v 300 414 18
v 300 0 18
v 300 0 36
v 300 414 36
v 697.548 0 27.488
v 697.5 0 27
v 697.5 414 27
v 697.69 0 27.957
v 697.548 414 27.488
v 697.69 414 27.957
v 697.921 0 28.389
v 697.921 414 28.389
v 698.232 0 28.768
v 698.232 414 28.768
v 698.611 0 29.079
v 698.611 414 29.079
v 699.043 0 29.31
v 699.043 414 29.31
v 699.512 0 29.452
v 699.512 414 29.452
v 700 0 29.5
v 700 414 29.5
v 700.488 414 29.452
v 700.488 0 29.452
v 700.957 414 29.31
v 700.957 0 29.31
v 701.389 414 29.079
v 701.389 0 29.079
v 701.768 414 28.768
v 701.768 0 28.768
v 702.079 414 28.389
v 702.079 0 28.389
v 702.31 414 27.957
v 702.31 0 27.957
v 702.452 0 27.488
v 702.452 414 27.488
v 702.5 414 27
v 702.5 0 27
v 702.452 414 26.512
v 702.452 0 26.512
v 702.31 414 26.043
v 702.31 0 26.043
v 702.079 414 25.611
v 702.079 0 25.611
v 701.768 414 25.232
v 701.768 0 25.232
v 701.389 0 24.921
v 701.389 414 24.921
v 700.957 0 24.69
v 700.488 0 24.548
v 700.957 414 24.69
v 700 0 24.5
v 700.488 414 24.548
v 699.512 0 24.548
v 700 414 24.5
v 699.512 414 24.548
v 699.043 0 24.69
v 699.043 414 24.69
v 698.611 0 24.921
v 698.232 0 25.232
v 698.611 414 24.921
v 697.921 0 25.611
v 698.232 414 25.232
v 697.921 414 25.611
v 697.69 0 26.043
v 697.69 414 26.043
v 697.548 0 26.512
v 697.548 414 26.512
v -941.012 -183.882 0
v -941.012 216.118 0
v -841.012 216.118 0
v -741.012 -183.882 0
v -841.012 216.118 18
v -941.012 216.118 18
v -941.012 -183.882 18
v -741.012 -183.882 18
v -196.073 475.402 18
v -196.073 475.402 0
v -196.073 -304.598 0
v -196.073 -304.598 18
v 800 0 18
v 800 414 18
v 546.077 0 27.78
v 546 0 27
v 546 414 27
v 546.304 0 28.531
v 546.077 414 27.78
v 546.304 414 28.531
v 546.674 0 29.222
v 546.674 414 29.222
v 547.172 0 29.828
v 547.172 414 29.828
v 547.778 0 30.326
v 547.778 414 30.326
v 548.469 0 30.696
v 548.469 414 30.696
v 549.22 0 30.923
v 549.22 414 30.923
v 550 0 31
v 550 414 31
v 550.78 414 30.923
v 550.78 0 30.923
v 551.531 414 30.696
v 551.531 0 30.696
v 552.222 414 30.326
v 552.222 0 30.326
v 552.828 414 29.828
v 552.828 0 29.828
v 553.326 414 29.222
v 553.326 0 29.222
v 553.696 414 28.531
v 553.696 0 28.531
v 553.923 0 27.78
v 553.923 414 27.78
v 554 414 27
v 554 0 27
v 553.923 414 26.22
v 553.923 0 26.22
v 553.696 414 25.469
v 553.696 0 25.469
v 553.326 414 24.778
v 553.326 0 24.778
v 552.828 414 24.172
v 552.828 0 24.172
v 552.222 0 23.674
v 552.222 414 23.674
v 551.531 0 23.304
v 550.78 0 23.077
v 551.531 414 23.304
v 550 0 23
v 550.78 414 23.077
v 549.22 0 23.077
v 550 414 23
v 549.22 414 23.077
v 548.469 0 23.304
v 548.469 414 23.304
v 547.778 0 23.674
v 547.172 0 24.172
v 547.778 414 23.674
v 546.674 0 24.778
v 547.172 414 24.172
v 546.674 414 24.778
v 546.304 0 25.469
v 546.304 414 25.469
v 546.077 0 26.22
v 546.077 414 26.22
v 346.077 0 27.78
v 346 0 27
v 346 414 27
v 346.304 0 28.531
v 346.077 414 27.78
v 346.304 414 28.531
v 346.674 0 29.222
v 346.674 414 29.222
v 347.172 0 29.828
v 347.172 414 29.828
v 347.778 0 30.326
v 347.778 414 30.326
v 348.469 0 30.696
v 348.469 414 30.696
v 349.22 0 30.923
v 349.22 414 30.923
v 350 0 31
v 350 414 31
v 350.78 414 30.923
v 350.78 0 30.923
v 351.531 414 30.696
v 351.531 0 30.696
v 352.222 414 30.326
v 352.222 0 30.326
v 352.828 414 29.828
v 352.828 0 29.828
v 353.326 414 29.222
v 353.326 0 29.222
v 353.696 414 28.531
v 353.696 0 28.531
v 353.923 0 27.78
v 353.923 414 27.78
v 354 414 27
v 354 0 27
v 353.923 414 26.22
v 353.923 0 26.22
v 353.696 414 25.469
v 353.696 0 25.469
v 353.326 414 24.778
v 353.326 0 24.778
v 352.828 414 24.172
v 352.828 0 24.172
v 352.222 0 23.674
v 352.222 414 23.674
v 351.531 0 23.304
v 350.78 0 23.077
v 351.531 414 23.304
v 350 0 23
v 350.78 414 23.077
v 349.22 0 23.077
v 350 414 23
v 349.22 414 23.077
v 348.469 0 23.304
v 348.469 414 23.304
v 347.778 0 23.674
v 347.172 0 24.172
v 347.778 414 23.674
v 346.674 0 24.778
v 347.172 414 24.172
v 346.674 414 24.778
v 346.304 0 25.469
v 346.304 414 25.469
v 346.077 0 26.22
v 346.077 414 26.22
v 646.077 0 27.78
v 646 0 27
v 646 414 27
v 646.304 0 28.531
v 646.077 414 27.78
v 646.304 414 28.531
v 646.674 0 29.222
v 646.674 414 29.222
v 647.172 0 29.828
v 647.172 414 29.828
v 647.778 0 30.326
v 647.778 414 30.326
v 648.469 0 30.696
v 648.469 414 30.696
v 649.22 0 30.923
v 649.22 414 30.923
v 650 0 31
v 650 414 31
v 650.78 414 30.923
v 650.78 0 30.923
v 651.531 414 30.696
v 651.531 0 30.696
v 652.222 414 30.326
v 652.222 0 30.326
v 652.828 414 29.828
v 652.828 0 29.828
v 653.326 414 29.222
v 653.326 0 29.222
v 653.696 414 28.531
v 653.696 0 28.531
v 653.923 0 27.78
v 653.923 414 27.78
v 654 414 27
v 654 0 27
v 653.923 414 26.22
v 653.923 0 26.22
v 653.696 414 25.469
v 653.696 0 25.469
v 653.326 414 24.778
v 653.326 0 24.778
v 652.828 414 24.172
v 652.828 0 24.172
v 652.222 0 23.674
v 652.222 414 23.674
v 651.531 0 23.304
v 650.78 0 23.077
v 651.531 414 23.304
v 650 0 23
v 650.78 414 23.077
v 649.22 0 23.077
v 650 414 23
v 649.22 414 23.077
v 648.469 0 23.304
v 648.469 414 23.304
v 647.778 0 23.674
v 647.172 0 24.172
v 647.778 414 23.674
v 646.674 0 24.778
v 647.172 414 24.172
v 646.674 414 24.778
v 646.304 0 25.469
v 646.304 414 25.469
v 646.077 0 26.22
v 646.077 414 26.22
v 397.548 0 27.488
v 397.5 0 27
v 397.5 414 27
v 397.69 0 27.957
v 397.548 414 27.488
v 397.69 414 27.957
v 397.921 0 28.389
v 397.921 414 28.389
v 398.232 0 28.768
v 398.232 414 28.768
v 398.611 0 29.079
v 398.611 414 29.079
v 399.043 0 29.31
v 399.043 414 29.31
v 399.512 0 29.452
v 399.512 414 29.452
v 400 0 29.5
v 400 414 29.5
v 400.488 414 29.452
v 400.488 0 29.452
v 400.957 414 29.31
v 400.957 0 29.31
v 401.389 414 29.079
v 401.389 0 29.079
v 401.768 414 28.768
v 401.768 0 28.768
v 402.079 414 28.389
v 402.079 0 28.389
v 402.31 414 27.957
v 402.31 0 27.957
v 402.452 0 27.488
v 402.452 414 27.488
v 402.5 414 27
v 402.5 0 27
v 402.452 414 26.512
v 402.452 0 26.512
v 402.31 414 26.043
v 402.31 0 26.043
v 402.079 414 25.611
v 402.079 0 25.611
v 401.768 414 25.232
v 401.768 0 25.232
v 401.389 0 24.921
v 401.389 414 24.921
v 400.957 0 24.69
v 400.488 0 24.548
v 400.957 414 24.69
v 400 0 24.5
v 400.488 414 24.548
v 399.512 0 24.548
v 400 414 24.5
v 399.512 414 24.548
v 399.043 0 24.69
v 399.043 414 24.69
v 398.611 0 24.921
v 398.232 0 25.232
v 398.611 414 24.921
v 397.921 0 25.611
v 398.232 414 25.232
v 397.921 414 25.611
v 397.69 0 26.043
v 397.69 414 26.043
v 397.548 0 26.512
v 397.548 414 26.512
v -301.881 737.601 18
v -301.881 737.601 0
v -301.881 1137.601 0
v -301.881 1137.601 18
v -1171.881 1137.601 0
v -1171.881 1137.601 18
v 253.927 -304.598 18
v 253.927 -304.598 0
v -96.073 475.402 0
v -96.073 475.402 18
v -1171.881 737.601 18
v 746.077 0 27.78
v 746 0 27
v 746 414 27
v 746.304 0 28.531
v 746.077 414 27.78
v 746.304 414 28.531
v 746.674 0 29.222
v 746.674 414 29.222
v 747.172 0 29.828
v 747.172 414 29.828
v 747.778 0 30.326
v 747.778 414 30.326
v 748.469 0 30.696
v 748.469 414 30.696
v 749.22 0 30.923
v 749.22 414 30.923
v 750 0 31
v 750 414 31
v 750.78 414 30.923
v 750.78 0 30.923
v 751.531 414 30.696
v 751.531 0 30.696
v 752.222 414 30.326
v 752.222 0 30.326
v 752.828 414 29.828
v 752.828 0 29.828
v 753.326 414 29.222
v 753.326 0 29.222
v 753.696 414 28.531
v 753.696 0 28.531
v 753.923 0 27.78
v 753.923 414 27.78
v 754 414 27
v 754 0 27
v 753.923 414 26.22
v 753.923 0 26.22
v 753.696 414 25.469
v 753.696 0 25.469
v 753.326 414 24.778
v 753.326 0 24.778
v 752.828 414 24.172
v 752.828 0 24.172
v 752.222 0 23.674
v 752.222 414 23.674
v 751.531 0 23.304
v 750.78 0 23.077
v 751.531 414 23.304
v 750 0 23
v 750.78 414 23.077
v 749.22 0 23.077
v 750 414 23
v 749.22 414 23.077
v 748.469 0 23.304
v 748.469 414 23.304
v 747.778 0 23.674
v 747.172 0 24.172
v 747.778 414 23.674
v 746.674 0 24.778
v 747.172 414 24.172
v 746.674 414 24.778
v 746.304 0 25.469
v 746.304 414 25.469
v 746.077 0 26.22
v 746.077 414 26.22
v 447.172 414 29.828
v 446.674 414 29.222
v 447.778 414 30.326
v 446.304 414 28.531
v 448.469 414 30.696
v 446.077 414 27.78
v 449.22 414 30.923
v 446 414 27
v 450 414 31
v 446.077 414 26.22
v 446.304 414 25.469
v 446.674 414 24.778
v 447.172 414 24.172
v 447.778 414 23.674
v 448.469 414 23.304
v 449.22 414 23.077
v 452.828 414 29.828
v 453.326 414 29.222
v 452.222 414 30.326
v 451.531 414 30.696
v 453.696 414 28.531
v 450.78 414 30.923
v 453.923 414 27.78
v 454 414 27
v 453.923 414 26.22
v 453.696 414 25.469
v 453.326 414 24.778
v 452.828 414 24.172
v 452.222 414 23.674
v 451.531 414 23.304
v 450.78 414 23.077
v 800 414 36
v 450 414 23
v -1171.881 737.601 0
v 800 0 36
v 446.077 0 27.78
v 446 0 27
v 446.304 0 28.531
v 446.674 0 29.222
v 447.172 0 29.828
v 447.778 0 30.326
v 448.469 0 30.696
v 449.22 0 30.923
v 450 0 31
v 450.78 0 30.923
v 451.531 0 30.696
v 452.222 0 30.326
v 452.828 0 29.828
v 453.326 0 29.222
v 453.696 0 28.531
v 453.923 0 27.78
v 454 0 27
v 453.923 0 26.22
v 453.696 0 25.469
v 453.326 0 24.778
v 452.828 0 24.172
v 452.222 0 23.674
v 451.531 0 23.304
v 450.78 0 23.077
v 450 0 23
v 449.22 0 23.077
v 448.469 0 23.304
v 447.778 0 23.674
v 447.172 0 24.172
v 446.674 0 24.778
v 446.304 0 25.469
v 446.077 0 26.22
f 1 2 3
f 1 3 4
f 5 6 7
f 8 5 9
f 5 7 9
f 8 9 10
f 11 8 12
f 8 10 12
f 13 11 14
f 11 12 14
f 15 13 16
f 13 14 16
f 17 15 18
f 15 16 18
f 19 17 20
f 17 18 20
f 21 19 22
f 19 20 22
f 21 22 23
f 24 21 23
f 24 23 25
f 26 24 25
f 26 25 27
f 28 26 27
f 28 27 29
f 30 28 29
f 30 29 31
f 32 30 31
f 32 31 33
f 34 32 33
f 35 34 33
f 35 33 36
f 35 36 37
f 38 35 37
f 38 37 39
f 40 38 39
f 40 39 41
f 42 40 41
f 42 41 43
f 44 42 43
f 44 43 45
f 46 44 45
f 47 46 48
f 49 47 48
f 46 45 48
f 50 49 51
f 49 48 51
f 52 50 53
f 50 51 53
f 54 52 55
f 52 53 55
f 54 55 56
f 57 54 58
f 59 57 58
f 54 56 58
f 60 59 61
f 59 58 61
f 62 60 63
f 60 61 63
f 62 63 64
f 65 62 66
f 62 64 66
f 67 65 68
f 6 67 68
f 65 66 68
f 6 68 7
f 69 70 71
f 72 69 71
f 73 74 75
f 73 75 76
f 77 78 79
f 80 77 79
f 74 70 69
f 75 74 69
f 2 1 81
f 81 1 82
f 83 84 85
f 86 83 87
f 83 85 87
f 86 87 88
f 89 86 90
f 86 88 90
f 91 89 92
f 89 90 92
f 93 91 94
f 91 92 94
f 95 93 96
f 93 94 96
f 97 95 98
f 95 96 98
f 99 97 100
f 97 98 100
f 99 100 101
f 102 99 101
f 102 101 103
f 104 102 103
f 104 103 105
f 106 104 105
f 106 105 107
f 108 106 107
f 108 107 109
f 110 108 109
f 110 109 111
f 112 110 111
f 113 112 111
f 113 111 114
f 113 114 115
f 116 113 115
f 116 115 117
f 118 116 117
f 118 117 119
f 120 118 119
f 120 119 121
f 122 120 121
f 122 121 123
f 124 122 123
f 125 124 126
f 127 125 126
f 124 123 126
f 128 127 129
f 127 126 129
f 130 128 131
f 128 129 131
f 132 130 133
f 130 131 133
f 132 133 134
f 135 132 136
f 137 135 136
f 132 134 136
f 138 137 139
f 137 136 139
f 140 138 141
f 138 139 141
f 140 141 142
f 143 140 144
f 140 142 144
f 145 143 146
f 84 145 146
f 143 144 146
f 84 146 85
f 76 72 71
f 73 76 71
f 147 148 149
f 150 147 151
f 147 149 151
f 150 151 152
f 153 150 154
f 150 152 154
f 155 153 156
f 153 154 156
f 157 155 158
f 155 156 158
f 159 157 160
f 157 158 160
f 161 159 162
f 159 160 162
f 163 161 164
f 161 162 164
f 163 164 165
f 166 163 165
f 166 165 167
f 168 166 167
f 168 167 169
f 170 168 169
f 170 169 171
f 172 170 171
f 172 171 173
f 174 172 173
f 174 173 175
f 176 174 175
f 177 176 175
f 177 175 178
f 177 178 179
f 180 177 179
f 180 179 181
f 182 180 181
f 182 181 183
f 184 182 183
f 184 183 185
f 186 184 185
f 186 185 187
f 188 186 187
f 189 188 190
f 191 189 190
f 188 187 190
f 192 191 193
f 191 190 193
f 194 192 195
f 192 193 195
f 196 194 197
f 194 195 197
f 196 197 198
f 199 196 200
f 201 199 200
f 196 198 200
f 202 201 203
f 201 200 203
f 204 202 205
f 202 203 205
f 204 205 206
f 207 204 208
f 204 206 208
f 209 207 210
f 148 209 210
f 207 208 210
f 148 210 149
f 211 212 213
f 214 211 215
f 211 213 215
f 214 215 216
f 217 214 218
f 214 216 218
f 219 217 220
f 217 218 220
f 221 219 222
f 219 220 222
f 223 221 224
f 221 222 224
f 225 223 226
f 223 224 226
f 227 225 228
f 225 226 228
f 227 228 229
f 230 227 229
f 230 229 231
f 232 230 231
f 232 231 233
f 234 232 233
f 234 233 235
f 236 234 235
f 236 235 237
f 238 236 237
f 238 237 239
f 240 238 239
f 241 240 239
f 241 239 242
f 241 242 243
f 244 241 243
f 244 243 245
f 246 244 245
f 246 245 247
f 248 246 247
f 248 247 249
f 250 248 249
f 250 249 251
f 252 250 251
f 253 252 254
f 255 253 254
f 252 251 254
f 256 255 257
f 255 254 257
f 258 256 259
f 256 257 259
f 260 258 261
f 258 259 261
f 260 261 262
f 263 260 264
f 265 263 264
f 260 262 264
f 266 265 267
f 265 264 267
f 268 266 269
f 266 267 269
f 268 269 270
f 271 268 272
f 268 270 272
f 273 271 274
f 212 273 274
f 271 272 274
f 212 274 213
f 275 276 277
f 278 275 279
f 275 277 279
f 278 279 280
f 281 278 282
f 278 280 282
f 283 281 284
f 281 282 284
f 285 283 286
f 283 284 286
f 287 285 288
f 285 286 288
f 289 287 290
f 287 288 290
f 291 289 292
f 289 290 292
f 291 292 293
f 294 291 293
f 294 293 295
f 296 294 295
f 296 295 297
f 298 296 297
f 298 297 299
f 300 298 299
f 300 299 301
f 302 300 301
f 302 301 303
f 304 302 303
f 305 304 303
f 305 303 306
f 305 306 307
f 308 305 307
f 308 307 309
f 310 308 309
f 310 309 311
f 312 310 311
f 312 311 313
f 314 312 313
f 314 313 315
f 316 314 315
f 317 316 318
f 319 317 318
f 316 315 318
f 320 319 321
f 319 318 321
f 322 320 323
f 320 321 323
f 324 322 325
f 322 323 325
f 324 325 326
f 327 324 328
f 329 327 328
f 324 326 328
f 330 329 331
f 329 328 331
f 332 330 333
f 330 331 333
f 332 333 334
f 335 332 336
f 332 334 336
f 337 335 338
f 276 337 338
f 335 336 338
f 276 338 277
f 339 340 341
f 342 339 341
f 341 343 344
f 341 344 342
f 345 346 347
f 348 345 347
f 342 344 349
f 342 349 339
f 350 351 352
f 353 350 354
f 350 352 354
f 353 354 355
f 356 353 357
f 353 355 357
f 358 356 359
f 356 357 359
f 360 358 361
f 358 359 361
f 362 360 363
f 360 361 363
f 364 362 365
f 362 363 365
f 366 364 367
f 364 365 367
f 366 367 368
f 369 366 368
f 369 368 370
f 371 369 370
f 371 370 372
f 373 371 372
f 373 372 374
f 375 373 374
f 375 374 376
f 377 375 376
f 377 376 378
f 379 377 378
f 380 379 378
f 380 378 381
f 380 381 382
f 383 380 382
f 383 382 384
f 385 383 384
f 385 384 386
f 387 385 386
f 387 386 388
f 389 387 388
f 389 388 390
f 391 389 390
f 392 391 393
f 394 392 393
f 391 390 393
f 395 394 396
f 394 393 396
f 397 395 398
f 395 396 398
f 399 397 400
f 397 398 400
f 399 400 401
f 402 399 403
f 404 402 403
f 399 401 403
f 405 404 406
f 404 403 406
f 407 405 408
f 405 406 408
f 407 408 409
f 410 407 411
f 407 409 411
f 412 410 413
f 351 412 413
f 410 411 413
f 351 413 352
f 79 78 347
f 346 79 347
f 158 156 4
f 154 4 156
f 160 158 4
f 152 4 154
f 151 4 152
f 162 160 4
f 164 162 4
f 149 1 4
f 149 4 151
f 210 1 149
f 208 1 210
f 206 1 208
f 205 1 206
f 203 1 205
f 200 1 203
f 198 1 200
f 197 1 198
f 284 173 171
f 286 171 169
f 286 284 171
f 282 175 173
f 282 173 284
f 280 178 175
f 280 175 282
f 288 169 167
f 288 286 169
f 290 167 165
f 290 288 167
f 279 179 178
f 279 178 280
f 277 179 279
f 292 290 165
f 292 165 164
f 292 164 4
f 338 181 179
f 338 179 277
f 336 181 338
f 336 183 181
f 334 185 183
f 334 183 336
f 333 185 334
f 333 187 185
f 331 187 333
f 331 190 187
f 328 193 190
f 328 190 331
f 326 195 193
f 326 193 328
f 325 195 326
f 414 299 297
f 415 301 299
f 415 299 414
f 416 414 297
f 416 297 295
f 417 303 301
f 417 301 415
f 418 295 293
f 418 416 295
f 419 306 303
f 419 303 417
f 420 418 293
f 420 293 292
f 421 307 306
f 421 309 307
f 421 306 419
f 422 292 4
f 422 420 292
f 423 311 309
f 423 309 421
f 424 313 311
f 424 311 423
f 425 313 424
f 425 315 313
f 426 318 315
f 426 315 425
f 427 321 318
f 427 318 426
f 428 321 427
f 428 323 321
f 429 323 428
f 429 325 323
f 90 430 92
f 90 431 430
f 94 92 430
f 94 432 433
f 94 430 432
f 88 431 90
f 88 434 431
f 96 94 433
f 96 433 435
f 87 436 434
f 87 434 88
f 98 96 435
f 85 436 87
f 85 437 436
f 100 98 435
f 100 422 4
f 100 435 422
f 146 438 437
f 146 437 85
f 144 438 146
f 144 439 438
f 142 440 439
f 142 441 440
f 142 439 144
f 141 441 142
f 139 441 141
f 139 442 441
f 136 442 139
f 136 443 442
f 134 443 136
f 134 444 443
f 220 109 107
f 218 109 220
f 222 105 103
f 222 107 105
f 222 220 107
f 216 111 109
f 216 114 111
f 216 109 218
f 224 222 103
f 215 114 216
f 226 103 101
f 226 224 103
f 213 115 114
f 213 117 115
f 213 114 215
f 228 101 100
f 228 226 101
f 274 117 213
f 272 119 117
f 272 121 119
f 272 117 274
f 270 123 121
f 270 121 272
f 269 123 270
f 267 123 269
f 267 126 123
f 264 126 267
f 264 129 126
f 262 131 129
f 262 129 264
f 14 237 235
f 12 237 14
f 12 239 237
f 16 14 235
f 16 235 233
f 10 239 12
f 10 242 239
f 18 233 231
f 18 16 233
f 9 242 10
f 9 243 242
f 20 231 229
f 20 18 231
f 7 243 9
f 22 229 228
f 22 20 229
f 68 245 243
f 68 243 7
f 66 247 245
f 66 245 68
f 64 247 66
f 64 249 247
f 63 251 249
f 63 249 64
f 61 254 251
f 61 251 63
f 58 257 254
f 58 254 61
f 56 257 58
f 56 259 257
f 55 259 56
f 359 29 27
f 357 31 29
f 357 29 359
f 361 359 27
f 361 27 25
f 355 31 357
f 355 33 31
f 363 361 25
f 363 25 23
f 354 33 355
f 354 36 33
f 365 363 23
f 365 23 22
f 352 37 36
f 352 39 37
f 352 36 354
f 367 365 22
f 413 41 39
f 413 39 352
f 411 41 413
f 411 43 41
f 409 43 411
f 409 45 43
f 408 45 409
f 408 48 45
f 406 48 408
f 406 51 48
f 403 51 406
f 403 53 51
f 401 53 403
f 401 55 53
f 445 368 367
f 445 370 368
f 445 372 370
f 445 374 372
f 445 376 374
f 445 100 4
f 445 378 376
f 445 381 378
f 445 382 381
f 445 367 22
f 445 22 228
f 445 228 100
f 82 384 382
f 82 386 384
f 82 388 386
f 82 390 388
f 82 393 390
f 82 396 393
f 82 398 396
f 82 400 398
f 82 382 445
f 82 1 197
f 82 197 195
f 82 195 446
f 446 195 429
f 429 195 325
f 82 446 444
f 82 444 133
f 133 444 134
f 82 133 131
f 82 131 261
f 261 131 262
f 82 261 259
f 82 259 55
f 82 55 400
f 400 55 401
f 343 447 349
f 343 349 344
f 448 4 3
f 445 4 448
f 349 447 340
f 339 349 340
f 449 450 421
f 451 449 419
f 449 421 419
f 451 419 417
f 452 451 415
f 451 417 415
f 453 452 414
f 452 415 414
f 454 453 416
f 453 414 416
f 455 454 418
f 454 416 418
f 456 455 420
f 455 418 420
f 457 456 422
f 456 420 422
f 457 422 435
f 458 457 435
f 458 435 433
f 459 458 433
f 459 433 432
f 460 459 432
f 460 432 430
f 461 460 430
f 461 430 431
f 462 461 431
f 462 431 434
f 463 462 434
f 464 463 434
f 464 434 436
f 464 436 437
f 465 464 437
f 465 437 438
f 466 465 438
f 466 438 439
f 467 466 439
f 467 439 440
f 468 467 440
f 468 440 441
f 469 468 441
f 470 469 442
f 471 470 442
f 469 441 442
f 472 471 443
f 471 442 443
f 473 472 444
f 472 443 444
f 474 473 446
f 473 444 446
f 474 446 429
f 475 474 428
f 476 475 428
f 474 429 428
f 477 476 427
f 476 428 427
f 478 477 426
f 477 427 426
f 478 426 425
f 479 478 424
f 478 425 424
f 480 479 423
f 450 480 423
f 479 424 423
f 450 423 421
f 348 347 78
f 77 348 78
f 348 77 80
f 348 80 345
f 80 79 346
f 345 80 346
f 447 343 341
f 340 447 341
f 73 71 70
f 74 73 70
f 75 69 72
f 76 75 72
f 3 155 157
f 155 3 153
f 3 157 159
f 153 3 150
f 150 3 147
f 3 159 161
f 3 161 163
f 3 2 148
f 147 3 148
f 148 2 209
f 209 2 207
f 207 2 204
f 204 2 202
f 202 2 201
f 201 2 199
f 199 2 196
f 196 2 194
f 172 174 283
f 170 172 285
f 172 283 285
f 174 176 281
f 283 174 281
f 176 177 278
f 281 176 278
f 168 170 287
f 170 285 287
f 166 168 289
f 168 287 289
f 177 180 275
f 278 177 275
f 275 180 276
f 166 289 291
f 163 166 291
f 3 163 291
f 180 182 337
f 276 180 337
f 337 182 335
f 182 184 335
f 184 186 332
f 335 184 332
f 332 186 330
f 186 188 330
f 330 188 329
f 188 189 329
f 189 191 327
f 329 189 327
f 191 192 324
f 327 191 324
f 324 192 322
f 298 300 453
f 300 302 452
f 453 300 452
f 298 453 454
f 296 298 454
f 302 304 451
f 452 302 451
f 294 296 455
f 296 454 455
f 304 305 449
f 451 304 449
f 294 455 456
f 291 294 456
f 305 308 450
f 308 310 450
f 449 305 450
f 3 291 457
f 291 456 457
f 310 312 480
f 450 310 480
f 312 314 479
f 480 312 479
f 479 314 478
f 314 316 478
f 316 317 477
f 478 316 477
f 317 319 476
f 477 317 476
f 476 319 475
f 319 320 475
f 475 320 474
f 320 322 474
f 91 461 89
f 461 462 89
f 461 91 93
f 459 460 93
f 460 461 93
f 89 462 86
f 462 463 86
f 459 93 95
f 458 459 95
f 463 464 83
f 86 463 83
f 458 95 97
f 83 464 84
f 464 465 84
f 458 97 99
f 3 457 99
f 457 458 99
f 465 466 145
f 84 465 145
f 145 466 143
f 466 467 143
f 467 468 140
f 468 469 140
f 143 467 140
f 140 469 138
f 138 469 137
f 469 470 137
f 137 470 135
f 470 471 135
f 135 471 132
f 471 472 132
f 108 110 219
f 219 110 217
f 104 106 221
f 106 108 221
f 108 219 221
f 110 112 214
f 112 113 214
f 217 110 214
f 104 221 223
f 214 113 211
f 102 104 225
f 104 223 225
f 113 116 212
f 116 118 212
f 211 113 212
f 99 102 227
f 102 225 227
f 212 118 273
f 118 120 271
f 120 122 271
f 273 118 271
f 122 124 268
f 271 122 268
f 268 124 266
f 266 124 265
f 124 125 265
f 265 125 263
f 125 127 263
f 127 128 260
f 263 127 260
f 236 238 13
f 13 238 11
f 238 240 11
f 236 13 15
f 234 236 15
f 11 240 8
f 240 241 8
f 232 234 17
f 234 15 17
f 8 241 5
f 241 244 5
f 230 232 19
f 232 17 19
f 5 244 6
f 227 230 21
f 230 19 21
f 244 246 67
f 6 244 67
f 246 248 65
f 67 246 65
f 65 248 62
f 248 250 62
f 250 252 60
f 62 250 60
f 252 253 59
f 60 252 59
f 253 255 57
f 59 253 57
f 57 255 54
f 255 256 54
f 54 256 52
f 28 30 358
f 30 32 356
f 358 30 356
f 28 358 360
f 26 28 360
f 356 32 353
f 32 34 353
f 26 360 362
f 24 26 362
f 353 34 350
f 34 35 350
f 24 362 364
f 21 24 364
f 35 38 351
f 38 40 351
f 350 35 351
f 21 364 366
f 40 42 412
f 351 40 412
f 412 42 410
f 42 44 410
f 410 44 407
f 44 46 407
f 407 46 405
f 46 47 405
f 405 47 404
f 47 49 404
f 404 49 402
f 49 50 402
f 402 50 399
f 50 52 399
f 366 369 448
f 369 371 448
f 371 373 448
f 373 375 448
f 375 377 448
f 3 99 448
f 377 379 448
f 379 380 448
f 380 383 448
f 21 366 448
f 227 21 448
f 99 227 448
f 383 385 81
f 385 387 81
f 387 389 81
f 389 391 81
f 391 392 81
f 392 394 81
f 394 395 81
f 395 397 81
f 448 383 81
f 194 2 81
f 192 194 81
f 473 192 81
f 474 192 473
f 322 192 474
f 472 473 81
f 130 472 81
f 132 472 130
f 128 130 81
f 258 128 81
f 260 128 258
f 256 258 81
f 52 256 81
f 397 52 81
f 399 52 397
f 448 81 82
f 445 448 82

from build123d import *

# Parameters (mm, degrees)
F1_DEPTH  = 18
F2_W      = 500
F2_H      = 414
F3_DEPTH  = 18
F4_DEPTH  = 18
F6_D      = 8
F8_DEPTH  = 18
F9_W      = 870
F9_H      = 400
F10_DEPTH = 18
F11_D     = 5


with BuildPart() as f1:
    # F0 (on Top) → F1 (new body)
    with BuildSketch(Plane.XY):
        Polygon((-196.072614, 475.402147), (-196.072614, -304.597853), (253.927386, -304.597853), (-96.072614, 475.402147), align=None)
    extrude(amount=F1_DEPTH)


with BuildPart() as f3:
    # F2 (on face) → F3 (new body)
    with BuildSketch(Plane.XY.offset(18)):
        with Locations((550, 207)):
            Rectangle(F2_W, F2_H)
    extrude(amount=F3_DEPTH)

    # F2 (on face) → F4 (join)
    with BuildSketch(Plane.XY.offset(18)):
        with Locations((550, 207)):
            Rectangle(F2_W, F2_H)
    extrude(amount=F4_DEPTH)

    # F6 (through all)
    with Locations(Plane.XZ):
        with Locations((350, 27), (450, 27), (550, 27), (650, 27), (750, 27)):
            Hole(F6_D / 2)

    # F11 (through all)
    with Locations(Plane.XZ):
        with Locations((400, 27), (700, 27)):
            Hole(F11_D / 2)


with BuildPart() as f8:
    # F7 (on Top) → F8 (new body)
    with BuildSketch(Plane.XY):
        Polygon((-941.011737, 216.118392), (-941.011737, -183.881608), (-741.011737, -183.881608), (-841.011737, 216.118392), align=None)
    extrude(amount=F8_DEPTH)


with BuildPart() as f10:
    # F9 (on Top) → F10 (new body)
    with BuildSketch(Plane.XY):
        with Locations((-736.880773, 937.600613)):
            Rectangle(F9_W, F9_H)
    extrude(amount=F10_DEPTH)


solid = Compound([f1.part, f3.part, f8.part, f10.part])
